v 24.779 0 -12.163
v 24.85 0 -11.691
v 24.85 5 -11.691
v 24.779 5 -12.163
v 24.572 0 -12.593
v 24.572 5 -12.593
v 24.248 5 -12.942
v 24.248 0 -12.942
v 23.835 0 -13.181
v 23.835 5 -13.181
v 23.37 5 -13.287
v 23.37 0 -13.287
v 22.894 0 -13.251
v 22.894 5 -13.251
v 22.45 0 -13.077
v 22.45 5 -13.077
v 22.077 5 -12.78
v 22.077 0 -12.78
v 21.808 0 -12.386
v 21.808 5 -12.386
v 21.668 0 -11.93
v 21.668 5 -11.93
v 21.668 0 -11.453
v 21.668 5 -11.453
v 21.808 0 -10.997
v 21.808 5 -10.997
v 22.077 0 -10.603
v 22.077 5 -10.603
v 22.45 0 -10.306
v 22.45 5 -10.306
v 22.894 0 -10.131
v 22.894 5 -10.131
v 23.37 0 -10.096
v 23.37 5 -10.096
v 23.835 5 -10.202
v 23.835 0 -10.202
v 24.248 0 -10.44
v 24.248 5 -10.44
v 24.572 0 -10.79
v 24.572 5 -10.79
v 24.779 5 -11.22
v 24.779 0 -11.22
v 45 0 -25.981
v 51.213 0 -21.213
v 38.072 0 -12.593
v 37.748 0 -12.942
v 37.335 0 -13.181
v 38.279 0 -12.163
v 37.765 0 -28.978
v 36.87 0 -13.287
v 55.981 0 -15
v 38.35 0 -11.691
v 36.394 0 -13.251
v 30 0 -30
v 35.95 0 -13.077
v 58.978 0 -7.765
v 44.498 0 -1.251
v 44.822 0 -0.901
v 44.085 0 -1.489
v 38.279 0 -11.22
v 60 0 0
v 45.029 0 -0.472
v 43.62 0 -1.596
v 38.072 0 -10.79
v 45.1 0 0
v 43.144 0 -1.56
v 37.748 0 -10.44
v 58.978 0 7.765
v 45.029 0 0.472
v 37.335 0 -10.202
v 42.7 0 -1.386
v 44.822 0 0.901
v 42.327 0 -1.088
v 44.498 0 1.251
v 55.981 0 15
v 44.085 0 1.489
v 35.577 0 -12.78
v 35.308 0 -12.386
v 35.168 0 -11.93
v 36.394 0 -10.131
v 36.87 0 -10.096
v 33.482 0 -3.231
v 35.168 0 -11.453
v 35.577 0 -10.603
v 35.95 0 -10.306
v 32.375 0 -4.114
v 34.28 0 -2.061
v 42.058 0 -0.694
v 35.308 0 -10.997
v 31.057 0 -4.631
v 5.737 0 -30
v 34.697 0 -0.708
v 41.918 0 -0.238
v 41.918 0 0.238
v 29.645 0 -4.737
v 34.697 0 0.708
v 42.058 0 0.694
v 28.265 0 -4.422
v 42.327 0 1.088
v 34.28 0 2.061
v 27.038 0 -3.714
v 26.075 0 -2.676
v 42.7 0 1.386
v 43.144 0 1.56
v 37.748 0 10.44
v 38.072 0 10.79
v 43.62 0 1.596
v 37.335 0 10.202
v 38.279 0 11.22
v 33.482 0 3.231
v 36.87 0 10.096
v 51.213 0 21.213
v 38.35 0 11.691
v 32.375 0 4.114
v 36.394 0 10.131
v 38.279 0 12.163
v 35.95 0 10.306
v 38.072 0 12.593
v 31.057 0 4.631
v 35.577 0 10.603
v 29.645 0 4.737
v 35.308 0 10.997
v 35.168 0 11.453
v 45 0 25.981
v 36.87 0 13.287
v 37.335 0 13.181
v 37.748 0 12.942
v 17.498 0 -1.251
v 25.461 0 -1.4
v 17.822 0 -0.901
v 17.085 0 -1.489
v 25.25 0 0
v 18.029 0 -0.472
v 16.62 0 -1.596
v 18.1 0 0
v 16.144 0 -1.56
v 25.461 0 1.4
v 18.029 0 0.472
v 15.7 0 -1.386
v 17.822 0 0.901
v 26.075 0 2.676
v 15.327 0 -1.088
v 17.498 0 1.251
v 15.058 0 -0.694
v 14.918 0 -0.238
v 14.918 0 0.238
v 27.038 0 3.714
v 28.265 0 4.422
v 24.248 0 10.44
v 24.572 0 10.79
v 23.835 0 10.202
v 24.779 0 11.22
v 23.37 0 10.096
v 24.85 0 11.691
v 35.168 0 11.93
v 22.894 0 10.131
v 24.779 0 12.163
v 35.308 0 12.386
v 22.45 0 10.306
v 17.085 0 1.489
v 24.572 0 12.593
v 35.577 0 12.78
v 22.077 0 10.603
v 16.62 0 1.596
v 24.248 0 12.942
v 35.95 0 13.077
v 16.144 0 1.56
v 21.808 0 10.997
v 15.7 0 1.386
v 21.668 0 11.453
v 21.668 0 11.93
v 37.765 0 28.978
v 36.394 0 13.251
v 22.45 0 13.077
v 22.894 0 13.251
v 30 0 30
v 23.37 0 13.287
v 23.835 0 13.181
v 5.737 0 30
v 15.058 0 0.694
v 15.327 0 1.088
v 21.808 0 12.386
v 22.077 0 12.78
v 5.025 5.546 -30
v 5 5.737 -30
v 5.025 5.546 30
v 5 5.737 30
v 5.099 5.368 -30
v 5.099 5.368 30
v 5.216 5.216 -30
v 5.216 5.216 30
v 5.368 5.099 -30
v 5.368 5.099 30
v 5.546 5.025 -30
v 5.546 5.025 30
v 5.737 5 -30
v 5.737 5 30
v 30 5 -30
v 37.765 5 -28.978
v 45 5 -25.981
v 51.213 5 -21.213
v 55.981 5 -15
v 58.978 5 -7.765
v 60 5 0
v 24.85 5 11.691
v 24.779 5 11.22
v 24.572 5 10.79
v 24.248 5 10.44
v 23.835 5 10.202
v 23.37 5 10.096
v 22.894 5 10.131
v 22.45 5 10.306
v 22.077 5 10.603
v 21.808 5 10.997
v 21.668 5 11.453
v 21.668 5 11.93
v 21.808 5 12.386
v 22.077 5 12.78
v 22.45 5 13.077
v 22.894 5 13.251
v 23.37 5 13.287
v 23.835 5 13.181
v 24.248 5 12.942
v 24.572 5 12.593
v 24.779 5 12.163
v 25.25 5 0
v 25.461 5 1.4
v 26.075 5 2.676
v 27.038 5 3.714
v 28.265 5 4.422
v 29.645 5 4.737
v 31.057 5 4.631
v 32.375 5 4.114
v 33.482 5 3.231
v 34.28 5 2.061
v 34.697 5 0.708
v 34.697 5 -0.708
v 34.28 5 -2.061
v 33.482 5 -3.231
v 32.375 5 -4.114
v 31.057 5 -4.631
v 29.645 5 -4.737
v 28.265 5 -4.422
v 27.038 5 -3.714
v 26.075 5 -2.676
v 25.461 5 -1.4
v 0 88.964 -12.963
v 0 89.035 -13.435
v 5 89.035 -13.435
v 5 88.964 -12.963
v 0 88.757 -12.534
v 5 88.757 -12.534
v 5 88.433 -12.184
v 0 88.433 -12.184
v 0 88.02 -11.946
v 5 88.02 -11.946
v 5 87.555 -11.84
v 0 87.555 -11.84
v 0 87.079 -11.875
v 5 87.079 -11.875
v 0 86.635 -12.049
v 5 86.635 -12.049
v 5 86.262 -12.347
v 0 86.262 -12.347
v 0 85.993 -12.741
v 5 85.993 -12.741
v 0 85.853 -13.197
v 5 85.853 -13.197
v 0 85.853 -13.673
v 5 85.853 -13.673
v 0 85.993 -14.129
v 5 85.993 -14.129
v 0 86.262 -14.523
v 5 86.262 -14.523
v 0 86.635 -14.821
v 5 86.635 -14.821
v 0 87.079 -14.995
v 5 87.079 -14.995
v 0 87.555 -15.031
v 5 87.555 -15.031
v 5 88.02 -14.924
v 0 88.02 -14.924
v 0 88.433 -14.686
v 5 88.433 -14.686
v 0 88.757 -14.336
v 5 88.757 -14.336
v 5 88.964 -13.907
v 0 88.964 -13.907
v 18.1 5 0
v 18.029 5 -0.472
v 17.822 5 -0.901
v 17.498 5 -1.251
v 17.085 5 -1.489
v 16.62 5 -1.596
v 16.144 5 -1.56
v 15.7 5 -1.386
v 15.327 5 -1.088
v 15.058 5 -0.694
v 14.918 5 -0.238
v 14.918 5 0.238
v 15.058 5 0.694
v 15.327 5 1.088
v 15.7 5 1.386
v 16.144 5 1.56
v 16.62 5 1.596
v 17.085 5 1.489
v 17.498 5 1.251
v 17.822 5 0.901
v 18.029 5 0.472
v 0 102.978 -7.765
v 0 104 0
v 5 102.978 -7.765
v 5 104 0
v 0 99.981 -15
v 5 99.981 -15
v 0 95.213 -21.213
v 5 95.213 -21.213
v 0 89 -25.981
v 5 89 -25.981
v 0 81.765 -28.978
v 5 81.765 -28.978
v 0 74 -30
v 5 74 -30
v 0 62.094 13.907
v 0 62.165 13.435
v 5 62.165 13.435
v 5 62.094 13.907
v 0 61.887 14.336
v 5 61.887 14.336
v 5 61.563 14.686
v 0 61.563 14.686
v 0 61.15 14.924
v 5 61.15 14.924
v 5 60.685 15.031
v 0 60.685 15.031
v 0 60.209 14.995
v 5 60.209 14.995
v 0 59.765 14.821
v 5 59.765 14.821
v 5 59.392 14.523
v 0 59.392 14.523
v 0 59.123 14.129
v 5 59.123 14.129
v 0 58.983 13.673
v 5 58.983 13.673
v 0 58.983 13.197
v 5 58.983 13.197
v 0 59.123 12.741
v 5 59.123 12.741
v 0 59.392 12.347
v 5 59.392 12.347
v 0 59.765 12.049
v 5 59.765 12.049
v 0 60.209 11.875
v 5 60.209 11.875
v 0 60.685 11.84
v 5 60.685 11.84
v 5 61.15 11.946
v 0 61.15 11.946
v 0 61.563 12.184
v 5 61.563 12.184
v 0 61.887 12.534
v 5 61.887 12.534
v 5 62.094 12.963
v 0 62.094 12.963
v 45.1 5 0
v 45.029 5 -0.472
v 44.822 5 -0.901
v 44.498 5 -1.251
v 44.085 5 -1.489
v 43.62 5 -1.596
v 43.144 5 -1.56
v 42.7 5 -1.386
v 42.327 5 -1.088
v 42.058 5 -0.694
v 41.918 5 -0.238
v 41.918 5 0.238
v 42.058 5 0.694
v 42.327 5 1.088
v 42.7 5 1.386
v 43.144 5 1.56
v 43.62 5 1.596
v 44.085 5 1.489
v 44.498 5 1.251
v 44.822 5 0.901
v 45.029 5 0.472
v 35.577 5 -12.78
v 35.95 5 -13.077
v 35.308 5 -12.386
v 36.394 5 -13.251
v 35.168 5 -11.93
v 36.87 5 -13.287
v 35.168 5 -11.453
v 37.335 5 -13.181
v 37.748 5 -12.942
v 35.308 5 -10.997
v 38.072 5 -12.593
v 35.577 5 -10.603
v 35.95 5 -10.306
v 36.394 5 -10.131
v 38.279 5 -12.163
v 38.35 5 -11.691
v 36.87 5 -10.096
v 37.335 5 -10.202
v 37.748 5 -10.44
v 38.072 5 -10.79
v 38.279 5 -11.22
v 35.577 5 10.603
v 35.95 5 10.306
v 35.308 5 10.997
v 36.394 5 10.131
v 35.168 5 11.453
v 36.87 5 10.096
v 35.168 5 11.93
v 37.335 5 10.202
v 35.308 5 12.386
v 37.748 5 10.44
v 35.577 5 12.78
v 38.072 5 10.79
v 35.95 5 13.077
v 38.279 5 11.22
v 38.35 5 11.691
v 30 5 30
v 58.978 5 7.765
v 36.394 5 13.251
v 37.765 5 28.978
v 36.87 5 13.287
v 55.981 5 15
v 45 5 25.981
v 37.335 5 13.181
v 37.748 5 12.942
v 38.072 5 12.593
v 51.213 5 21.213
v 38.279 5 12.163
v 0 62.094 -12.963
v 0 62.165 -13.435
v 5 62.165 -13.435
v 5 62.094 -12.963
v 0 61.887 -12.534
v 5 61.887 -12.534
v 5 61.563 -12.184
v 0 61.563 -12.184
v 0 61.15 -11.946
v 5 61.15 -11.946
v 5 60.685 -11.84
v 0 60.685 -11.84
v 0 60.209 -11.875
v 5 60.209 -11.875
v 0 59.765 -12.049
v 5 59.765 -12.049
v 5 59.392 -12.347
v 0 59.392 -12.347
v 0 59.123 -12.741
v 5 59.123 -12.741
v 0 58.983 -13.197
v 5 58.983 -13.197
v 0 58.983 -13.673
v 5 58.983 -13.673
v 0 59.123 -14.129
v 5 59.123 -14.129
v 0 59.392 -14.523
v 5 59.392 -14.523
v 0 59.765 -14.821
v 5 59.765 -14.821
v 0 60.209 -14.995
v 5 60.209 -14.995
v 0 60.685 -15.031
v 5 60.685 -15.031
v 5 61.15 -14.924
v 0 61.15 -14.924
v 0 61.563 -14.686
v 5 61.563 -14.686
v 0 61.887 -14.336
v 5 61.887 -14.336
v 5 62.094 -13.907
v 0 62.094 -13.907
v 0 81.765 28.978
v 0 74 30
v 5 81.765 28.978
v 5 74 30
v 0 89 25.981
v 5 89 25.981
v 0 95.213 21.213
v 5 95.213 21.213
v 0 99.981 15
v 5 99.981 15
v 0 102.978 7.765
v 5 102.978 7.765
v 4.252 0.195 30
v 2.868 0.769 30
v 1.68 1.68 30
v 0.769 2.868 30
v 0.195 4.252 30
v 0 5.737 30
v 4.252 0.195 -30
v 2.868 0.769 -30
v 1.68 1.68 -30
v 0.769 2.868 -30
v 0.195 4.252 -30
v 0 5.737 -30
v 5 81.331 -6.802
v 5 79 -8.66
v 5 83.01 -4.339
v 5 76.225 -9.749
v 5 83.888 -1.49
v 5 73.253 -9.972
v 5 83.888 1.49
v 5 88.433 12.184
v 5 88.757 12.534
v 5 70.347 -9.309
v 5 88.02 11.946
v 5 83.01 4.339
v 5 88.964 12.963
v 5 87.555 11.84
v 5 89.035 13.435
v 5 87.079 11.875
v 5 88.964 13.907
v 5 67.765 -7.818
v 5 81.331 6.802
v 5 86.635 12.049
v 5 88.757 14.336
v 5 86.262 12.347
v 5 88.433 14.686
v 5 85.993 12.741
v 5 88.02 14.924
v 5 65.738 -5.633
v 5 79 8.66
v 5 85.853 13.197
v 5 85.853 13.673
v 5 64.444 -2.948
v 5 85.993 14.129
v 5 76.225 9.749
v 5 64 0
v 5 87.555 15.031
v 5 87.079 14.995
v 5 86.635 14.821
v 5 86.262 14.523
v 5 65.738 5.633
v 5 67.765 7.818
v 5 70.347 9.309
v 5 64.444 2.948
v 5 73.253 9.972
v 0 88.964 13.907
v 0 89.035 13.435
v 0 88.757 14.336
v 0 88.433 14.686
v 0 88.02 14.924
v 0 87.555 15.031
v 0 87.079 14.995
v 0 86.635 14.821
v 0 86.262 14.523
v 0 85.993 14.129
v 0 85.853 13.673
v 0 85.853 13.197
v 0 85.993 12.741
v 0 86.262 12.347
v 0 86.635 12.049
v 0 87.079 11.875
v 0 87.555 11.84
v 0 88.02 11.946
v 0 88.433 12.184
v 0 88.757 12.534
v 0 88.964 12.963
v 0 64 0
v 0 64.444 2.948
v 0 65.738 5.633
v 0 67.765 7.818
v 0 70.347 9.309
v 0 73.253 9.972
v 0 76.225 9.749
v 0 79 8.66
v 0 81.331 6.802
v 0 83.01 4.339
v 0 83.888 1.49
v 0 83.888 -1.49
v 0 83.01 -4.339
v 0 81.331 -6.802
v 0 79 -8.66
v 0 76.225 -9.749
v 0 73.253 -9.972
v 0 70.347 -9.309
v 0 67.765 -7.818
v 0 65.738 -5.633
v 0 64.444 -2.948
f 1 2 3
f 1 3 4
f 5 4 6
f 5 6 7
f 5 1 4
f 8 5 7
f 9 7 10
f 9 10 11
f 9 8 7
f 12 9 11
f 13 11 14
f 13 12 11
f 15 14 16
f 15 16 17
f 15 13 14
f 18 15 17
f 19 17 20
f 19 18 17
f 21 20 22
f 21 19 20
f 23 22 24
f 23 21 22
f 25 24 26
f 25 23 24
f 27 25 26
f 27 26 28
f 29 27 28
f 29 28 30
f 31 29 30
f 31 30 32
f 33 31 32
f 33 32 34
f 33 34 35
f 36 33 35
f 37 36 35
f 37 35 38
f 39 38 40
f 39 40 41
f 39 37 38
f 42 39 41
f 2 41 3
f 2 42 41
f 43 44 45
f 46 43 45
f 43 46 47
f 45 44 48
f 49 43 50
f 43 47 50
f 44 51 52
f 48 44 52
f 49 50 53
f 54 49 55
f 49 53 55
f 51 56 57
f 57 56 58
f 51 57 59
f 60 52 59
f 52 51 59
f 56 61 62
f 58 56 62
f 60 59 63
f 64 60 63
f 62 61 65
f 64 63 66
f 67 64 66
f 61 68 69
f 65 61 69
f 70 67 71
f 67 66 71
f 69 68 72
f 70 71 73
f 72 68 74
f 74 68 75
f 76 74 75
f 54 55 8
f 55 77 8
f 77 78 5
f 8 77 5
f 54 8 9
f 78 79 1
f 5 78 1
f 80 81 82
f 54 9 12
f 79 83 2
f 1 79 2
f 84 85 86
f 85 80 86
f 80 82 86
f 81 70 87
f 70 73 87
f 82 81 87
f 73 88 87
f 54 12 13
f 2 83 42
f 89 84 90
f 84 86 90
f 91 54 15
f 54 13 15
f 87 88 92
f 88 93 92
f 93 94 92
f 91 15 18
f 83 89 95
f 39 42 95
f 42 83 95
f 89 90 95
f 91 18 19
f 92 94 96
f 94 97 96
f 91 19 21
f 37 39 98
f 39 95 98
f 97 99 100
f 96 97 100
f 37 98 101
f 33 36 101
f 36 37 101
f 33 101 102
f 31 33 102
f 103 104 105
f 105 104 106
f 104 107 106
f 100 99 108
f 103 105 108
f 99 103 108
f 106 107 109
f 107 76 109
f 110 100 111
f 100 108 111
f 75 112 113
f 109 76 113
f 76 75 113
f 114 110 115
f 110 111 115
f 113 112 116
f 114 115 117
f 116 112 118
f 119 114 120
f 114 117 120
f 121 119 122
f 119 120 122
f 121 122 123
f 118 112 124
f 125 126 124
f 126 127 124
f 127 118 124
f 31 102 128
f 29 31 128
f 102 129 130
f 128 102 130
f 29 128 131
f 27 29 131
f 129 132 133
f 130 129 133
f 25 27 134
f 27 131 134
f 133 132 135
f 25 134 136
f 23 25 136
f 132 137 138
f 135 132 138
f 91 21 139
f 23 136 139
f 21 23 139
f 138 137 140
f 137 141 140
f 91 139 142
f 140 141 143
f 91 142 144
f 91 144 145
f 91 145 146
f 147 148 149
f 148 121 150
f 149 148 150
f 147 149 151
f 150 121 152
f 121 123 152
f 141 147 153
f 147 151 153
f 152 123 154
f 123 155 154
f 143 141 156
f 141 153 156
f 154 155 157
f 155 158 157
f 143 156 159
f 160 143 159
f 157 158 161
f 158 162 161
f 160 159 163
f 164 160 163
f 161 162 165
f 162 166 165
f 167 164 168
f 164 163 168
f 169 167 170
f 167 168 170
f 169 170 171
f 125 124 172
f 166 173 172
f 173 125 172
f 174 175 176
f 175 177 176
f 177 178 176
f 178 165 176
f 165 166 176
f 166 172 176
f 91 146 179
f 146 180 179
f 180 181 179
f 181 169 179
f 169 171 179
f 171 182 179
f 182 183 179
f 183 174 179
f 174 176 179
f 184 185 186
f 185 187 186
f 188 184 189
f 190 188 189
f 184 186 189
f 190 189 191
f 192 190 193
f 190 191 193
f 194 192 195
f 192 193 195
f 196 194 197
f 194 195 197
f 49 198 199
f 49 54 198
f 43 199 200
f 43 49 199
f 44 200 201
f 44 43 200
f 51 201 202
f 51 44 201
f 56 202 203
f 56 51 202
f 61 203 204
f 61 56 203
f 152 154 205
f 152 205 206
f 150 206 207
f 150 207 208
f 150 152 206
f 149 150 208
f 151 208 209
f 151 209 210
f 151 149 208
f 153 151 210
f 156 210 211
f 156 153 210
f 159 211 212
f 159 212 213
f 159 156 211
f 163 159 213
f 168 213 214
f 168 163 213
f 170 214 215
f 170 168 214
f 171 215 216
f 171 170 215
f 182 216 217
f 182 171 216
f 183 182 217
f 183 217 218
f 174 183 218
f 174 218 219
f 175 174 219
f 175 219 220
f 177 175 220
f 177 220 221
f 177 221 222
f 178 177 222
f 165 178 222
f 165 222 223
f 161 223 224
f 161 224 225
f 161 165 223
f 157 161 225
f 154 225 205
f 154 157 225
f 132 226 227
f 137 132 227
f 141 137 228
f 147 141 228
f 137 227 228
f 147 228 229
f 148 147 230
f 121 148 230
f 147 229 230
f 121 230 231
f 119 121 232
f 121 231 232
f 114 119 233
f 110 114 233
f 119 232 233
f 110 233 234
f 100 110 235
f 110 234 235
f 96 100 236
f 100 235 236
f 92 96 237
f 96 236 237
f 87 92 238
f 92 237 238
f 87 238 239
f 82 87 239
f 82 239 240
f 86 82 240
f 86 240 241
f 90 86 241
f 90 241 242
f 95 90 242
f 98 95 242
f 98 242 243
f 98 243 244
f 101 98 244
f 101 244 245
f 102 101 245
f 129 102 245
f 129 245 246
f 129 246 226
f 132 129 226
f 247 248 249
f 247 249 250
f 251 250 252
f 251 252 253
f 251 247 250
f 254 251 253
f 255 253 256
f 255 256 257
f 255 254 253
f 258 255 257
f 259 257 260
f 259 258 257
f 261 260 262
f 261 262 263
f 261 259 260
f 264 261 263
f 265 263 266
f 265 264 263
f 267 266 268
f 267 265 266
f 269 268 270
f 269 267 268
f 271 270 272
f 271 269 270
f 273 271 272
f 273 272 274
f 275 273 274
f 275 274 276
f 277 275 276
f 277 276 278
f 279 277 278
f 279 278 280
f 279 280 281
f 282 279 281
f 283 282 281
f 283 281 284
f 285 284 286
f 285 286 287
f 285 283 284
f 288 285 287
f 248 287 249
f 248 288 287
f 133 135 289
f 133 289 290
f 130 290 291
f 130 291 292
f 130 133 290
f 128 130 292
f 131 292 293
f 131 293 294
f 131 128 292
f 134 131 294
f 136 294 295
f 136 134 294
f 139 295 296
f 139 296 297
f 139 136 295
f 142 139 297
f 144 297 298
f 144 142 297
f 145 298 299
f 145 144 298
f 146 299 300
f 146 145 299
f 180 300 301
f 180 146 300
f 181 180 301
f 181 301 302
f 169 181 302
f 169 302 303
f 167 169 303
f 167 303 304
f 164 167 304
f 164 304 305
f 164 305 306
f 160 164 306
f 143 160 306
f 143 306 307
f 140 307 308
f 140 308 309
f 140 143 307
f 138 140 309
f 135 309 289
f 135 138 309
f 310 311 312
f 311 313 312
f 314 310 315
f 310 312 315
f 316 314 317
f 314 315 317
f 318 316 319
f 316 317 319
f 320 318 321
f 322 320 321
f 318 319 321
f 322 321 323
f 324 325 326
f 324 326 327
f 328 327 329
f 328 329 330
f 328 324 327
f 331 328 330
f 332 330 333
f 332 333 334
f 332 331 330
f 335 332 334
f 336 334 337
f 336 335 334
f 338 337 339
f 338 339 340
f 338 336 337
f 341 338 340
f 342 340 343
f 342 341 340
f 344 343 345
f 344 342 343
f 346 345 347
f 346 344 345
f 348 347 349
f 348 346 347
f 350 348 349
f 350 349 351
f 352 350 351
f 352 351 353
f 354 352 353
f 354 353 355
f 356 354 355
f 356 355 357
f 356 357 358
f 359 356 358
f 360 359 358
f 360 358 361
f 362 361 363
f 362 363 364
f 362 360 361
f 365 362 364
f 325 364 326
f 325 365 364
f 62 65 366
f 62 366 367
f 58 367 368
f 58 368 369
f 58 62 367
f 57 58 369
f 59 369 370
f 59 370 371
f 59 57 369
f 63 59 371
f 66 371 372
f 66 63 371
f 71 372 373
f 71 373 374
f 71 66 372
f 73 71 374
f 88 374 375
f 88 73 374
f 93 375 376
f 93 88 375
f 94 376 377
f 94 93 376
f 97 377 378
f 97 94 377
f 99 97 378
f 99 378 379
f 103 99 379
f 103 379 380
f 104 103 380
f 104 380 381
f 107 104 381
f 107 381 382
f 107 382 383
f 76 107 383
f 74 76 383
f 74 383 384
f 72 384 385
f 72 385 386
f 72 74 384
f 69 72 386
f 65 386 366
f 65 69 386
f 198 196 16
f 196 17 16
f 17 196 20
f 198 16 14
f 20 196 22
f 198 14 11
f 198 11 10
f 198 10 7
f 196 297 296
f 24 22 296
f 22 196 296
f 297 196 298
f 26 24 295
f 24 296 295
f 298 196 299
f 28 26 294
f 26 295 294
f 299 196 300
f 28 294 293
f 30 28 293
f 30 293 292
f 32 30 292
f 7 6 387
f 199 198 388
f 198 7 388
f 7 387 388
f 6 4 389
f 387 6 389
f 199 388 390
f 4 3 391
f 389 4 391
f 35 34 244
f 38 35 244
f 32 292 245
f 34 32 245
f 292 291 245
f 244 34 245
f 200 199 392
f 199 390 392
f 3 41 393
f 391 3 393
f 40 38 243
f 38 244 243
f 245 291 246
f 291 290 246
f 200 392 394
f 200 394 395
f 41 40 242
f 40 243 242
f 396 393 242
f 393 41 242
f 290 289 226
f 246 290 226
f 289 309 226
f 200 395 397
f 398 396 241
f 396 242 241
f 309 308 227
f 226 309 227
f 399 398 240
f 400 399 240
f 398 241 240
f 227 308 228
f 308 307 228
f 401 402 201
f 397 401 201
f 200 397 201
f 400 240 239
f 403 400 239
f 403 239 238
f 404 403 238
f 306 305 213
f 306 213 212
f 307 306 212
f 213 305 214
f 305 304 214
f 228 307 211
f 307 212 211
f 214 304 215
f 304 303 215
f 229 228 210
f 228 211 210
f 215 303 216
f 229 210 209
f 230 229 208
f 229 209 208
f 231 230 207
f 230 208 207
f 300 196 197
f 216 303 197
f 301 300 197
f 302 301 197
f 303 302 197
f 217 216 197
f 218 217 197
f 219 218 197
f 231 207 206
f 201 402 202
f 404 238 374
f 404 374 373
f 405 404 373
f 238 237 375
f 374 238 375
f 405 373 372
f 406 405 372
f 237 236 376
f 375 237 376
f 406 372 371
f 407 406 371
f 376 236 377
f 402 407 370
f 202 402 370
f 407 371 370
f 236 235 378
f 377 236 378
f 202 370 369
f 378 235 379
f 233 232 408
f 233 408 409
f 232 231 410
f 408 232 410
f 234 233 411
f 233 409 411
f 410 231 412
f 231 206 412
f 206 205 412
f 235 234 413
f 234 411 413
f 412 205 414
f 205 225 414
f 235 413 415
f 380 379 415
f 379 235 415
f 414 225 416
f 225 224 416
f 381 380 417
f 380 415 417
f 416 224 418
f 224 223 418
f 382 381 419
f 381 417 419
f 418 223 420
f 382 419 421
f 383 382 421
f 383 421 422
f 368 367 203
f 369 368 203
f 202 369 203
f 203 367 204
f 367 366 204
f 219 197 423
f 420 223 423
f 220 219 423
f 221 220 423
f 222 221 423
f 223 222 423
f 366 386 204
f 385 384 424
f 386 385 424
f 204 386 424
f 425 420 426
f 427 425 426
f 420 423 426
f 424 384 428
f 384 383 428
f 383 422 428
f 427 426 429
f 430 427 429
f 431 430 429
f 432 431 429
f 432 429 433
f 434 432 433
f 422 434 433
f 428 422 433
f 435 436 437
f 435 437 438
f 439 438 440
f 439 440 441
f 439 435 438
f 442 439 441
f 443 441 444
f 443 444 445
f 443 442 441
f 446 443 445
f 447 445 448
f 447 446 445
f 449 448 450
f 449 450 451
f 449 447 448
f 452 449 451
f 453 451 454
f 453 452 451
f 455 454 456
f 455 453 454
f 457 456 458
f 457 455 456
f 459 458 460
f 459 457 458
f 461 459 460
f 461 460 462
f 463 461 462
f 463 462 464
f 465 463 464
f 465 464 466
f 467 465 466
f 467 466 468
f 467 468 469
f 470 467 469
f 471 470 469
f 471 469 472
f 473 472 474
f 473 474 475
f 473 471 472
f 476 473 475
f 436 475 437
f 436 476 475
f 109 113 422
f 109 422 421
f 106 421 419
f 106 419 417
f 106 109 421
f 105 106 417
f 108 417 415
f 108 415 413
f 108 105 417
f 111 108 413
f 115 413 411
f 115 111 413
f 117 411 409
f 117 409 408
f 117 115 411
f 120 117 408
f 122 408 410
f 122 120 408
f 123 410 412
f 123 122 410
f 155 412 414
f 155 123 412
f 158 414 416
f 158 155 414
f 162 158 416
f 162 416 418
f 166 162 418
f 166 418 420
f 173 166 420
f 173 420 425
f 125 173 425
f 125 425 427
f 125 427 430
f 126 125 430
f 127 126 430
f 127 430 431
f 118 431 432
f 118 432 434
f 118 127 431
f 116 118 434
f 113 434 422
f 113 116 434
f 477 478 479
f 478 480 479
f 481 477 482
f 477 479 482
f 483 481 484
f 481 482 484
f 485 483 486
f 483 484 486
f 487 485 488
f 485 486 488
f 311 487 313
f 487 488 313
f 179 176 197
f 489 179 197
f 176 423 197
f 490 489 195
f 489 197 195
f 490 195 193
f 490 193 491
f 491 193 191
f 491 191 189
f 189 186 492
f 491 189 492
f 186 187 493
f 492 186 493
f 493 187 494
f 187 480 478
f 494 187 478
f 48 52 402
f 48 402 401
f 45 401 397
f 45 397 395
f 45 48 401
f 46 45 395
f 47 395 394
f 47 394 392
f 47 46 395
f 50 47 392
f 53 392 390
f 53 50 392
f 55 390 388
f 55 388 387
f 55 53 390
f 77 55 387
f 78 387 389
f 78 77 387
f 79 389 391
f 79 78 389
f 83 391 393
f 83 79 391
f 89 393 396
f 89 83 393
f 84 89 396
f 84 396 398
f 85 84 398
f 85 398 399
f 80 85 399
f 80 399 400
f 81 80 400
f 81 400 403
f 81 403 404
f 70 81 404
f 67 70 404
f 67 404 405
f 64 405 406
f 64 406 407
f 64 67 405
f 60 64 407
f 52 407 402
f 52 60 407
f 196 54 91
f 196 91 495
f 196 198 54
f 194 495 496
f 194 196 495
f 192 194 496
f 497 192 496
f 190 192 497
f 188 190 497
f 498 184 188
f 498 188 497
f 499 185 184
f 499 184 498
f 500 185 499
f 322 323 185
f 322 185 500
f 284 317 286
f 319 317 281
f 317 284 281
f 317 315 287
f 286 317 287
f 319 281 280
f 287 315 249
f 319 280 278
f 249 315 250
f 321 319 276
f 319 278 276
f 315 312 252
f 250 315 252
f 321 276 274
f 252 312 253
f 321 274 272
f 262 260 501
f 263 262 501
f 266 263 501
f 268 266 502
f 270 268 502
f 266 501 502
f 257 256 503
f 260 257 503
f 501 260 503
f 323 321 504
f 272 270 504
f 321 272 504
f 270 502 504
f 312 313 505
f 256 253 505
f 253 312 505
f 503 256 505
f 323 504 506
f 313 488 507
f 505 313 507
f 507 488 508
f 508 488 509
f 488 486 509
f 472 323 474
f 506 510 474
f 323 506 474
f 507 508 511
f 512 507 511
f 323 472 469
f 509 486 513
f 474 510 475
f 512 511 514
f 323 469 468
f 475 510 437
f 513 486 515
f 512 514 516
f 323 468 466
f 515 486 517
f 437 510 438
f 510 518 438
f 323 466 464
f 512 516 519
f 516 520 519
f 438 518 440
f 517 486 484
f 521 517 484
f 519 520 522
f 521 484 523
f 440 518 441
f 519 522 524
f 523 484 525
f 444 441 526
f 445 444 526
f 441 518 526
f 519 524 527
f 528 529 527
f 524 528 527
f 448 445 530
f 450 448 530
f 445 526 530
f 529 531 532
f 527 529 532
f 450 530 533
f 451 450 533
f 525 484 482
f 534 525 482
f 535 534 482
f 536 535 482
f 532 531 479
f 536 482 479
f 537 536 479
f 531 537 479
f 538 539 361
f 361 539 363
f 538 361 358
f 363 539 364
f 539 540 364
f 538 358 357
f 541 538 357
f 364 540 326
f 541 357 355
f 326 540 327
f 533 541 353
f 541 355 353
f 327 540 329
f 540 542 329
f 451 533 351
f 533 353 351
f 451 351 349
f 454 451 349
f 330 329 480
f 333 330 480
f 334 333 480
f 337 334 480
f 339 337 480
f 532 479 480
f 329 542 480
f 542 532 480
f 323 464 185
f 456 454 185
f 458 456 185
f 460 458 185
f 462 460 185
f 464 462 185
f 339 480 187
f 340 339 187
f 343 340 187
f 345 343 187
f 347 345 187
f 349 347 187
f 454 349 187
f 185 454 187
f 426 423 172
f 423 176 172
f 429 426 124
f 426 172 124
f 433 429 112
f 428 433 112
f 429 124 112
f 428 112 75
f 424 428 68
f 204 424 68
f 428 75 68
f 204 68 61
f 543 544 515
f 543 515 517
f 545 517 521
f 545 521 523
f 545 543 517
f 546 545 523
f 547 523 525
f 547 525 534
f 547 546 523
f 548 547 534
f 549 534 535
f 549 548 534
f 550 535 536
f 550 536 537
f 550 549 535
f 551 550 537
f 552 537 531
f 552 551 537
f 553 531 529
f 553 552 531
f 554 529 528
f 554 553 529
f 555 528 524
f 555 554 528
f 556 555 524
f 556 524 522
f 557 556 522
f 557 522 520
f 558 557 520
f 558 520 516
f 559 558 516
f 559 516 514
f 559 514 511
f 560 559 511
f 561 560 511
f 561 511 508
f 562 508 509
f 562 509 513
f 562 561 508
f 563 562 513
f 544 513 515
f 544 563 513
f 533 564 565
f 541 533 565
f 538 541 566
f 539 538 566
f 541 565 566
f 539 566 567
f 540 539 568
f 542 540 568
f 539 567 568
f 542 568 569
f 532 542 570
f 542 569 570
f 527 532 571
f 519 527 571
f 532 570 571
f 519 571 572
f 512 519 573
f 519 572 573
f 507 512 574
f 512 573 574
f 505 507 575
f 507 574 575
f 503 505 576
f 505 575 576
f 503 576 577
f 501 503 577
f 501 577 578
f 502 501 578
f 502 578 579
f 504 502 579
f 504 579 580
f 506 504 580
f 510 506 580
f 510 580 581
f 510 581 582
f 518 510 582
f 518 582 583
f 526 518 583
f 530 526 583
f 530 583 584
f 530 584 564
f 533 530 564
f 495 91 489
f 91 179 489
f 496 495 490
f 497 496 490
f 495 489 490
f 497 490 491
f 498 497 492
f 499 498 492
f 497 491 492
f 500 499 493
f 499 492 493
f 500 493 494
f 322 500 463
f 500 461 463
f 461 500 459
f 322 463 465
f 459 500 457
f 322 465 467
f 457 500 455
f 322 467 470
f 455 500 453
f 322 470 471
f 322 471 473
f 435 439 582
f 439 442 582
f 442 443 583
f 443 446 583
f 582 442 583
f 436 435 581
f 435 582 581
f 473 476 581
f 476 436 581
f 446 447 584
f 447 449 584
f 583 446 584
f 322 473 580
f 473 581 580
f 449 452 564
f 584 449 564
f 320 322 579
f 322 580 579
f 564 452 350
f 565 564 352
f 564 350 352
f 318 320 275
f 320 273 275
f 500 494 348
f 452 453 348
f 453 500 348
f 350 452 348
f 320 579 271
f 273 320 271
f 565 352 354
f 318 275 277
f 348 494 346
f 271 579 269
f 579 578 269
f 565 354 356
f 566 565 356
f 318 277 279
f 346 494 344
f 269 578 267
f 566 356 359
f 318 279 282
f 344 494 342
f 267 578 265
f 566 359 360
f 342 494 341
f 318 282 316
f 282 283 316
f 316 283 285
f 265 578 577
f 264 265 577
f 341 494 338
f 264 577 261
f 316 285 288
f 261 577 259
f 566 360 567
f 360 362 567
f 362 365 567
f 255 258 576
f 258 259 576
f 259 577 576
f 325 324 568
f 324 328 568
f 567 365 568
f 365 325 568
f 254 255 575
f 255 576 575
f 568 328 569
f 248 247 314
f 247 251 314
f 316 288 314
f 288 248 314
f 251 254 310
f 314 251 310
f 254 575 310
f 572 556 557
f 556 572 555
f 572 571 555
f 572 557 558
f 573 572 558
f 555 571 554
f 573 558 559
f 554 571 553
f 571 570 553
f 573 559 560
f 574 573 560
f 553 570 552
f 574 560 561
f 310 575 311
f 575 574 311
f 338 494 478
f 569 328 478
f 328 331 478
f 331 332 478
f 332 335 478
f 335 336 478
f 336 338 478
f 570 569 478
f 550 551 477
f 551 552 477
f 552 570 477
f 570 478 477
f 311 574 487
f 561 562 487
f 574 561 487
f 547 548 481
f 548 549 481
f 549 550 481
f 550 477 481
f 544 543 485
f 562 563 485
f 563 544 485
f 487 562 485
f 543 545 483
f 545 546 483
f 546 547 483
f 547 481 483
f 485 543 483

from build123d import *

# Parameters (mm, degrees)
SM_BASE_FLANGE_1_DEPTH  = 30
FILLET_1_R              = 30
SKETCH_2_R              = 4.75
CUT_EXTRUDE_1_DEPTH     = 10
HOLE_WIZARD_1_OUTLINE_R = 1.6
HOLE_WIZARD_1_DEPTH     = 5
SKETCH_5_R              = 10
CUT_EXTRUDE_2_DEPTH     = 10
HOLE_WIZARD_2_OUTLINE_R = 1.6
HOLE_WIZARD_2_DEPTH     = 5


# Read off the part's stored shape, not the designer's step: 孔1, 孔2
# Sheet-metal steps are written as plain solids
with BuildPart() as part:
    # Sketch 1 → 基体-法兰1 (new, symmetric)
    with BuildSketch(Plane.XY):
        with BuildLine():
            Line((60, 0), (5.7366, 0))
            ThreePointArc((5.7366, 0), (1.680211239, 1.680211239), (0, 5.7366))
            Line((0, 5.7366), (0, 104))
            Line((0, 104), (5, 104))
            Line((5, 104), (5, 5.7366))
            ThreePointArc((5, 5.7366), (5.215745145, 5.215745145), (5.7366, 5))
            Line((5.7366, 5), (60, 5))
            Line((60, 5), (60, 0))
        make_face()
    extrude(amount=SM_BASE_FLANGE_1_DEPTH, both=True)

    # 圆角1
    fillet_1_edges = [part.edges().sort_by_distance(p)[0] for p in [
        (60, 2.5, -30),
        (60, 2.5, 30),
        (2.5, 104, -30),
        (2.5, 104, 30),
    ]]
    fillet(fillet_1_edges, radius=FILLET_1_R - 0.0001)  # a hair under: the kernel refuses the full size

    # Sketch 2 → 切除-拉伸1 (cut)
    with BuildSketch(Plane(origin=(0, 5, 0), x_dir=(1, 0, 0), z_dir=(0, 1, 0))):
        with Locations(Location((30, 0, 0), (0, 0, 180))):
            Circle(SKETCH_2_R)
    extrude(amount=-CUT_EXTRUDE_1_DEPTH, mode=Mode.SUBTRACT)

    # 孔1 outline → 孔1 (cut)
    with BuildSketch(Plane(origin=(0, 0, 0), x_dir=(1, 0, 0), z_dir=(0, 1, 0))):
        with Locations((23.25, -11.691342951)):
            Circle(HOLE_WIZARD_1_OUTLINE_R)
        with Locations((16.5, 0)):
            Circle(HOLE_WIZARD_1_OUTLINE_R)
        with Locations((23.25, 11.691342951)):
            Circle(HOLE_WIZARD_1_OUTLINE_R)
        with Locations((36.75, 11.691342951)):
            Circle(HOLE_WIZARD_1_OUTLINE_R)
        with Locations((43.5, 0)):
            Circle(HOLE_WIZARD_1_OUTLINE_R)
        with Locations((36.75, -11.691342951)):
            Circle(HOLE_WIZARD_1_OUTLINE_R)
    extrude(amount=HOLE_WIZARD_1_DEPTH, mode=Mode.SUBTRACT)

    # 草图5 → 切除-拉伸2 (cut)
    with BuildSketch(Plane.ZY):
        with Locations(Location((0, 74, 0), (0, 0, 270))):
            Circle(SKETCH_5_R)
    extrude(amount=-CUT_EXTRUDE_2_DEPTH, mode=Mode.SUBTRACT)

    # 孔2 outline → 孔2 (cut)
    with BuildSketch(Plane.YZ):
        with Locations((60.564971157, 13.435028843)):
            Circle(HOLE_WIZARD_2_OUTLINE_R)
        with Locations((60.564971157, -13.435028843)):
            Circle(HOLE_WIZARD_2_OUTLINE_R)
        with Locations((87.435028843, -13.435028843)):
            Circle(HOLE_WIZARD_2_OUTLINE_R)
        with Locations((87.435028843, 13.435028843)):
            Circle(HOLE_WIZARD_2_OUTLINE_R)
    extrude(amount=HOLE_WIZARD_2_DEPTH, mode=Mode.SUBTRACT)


solid = part.part
